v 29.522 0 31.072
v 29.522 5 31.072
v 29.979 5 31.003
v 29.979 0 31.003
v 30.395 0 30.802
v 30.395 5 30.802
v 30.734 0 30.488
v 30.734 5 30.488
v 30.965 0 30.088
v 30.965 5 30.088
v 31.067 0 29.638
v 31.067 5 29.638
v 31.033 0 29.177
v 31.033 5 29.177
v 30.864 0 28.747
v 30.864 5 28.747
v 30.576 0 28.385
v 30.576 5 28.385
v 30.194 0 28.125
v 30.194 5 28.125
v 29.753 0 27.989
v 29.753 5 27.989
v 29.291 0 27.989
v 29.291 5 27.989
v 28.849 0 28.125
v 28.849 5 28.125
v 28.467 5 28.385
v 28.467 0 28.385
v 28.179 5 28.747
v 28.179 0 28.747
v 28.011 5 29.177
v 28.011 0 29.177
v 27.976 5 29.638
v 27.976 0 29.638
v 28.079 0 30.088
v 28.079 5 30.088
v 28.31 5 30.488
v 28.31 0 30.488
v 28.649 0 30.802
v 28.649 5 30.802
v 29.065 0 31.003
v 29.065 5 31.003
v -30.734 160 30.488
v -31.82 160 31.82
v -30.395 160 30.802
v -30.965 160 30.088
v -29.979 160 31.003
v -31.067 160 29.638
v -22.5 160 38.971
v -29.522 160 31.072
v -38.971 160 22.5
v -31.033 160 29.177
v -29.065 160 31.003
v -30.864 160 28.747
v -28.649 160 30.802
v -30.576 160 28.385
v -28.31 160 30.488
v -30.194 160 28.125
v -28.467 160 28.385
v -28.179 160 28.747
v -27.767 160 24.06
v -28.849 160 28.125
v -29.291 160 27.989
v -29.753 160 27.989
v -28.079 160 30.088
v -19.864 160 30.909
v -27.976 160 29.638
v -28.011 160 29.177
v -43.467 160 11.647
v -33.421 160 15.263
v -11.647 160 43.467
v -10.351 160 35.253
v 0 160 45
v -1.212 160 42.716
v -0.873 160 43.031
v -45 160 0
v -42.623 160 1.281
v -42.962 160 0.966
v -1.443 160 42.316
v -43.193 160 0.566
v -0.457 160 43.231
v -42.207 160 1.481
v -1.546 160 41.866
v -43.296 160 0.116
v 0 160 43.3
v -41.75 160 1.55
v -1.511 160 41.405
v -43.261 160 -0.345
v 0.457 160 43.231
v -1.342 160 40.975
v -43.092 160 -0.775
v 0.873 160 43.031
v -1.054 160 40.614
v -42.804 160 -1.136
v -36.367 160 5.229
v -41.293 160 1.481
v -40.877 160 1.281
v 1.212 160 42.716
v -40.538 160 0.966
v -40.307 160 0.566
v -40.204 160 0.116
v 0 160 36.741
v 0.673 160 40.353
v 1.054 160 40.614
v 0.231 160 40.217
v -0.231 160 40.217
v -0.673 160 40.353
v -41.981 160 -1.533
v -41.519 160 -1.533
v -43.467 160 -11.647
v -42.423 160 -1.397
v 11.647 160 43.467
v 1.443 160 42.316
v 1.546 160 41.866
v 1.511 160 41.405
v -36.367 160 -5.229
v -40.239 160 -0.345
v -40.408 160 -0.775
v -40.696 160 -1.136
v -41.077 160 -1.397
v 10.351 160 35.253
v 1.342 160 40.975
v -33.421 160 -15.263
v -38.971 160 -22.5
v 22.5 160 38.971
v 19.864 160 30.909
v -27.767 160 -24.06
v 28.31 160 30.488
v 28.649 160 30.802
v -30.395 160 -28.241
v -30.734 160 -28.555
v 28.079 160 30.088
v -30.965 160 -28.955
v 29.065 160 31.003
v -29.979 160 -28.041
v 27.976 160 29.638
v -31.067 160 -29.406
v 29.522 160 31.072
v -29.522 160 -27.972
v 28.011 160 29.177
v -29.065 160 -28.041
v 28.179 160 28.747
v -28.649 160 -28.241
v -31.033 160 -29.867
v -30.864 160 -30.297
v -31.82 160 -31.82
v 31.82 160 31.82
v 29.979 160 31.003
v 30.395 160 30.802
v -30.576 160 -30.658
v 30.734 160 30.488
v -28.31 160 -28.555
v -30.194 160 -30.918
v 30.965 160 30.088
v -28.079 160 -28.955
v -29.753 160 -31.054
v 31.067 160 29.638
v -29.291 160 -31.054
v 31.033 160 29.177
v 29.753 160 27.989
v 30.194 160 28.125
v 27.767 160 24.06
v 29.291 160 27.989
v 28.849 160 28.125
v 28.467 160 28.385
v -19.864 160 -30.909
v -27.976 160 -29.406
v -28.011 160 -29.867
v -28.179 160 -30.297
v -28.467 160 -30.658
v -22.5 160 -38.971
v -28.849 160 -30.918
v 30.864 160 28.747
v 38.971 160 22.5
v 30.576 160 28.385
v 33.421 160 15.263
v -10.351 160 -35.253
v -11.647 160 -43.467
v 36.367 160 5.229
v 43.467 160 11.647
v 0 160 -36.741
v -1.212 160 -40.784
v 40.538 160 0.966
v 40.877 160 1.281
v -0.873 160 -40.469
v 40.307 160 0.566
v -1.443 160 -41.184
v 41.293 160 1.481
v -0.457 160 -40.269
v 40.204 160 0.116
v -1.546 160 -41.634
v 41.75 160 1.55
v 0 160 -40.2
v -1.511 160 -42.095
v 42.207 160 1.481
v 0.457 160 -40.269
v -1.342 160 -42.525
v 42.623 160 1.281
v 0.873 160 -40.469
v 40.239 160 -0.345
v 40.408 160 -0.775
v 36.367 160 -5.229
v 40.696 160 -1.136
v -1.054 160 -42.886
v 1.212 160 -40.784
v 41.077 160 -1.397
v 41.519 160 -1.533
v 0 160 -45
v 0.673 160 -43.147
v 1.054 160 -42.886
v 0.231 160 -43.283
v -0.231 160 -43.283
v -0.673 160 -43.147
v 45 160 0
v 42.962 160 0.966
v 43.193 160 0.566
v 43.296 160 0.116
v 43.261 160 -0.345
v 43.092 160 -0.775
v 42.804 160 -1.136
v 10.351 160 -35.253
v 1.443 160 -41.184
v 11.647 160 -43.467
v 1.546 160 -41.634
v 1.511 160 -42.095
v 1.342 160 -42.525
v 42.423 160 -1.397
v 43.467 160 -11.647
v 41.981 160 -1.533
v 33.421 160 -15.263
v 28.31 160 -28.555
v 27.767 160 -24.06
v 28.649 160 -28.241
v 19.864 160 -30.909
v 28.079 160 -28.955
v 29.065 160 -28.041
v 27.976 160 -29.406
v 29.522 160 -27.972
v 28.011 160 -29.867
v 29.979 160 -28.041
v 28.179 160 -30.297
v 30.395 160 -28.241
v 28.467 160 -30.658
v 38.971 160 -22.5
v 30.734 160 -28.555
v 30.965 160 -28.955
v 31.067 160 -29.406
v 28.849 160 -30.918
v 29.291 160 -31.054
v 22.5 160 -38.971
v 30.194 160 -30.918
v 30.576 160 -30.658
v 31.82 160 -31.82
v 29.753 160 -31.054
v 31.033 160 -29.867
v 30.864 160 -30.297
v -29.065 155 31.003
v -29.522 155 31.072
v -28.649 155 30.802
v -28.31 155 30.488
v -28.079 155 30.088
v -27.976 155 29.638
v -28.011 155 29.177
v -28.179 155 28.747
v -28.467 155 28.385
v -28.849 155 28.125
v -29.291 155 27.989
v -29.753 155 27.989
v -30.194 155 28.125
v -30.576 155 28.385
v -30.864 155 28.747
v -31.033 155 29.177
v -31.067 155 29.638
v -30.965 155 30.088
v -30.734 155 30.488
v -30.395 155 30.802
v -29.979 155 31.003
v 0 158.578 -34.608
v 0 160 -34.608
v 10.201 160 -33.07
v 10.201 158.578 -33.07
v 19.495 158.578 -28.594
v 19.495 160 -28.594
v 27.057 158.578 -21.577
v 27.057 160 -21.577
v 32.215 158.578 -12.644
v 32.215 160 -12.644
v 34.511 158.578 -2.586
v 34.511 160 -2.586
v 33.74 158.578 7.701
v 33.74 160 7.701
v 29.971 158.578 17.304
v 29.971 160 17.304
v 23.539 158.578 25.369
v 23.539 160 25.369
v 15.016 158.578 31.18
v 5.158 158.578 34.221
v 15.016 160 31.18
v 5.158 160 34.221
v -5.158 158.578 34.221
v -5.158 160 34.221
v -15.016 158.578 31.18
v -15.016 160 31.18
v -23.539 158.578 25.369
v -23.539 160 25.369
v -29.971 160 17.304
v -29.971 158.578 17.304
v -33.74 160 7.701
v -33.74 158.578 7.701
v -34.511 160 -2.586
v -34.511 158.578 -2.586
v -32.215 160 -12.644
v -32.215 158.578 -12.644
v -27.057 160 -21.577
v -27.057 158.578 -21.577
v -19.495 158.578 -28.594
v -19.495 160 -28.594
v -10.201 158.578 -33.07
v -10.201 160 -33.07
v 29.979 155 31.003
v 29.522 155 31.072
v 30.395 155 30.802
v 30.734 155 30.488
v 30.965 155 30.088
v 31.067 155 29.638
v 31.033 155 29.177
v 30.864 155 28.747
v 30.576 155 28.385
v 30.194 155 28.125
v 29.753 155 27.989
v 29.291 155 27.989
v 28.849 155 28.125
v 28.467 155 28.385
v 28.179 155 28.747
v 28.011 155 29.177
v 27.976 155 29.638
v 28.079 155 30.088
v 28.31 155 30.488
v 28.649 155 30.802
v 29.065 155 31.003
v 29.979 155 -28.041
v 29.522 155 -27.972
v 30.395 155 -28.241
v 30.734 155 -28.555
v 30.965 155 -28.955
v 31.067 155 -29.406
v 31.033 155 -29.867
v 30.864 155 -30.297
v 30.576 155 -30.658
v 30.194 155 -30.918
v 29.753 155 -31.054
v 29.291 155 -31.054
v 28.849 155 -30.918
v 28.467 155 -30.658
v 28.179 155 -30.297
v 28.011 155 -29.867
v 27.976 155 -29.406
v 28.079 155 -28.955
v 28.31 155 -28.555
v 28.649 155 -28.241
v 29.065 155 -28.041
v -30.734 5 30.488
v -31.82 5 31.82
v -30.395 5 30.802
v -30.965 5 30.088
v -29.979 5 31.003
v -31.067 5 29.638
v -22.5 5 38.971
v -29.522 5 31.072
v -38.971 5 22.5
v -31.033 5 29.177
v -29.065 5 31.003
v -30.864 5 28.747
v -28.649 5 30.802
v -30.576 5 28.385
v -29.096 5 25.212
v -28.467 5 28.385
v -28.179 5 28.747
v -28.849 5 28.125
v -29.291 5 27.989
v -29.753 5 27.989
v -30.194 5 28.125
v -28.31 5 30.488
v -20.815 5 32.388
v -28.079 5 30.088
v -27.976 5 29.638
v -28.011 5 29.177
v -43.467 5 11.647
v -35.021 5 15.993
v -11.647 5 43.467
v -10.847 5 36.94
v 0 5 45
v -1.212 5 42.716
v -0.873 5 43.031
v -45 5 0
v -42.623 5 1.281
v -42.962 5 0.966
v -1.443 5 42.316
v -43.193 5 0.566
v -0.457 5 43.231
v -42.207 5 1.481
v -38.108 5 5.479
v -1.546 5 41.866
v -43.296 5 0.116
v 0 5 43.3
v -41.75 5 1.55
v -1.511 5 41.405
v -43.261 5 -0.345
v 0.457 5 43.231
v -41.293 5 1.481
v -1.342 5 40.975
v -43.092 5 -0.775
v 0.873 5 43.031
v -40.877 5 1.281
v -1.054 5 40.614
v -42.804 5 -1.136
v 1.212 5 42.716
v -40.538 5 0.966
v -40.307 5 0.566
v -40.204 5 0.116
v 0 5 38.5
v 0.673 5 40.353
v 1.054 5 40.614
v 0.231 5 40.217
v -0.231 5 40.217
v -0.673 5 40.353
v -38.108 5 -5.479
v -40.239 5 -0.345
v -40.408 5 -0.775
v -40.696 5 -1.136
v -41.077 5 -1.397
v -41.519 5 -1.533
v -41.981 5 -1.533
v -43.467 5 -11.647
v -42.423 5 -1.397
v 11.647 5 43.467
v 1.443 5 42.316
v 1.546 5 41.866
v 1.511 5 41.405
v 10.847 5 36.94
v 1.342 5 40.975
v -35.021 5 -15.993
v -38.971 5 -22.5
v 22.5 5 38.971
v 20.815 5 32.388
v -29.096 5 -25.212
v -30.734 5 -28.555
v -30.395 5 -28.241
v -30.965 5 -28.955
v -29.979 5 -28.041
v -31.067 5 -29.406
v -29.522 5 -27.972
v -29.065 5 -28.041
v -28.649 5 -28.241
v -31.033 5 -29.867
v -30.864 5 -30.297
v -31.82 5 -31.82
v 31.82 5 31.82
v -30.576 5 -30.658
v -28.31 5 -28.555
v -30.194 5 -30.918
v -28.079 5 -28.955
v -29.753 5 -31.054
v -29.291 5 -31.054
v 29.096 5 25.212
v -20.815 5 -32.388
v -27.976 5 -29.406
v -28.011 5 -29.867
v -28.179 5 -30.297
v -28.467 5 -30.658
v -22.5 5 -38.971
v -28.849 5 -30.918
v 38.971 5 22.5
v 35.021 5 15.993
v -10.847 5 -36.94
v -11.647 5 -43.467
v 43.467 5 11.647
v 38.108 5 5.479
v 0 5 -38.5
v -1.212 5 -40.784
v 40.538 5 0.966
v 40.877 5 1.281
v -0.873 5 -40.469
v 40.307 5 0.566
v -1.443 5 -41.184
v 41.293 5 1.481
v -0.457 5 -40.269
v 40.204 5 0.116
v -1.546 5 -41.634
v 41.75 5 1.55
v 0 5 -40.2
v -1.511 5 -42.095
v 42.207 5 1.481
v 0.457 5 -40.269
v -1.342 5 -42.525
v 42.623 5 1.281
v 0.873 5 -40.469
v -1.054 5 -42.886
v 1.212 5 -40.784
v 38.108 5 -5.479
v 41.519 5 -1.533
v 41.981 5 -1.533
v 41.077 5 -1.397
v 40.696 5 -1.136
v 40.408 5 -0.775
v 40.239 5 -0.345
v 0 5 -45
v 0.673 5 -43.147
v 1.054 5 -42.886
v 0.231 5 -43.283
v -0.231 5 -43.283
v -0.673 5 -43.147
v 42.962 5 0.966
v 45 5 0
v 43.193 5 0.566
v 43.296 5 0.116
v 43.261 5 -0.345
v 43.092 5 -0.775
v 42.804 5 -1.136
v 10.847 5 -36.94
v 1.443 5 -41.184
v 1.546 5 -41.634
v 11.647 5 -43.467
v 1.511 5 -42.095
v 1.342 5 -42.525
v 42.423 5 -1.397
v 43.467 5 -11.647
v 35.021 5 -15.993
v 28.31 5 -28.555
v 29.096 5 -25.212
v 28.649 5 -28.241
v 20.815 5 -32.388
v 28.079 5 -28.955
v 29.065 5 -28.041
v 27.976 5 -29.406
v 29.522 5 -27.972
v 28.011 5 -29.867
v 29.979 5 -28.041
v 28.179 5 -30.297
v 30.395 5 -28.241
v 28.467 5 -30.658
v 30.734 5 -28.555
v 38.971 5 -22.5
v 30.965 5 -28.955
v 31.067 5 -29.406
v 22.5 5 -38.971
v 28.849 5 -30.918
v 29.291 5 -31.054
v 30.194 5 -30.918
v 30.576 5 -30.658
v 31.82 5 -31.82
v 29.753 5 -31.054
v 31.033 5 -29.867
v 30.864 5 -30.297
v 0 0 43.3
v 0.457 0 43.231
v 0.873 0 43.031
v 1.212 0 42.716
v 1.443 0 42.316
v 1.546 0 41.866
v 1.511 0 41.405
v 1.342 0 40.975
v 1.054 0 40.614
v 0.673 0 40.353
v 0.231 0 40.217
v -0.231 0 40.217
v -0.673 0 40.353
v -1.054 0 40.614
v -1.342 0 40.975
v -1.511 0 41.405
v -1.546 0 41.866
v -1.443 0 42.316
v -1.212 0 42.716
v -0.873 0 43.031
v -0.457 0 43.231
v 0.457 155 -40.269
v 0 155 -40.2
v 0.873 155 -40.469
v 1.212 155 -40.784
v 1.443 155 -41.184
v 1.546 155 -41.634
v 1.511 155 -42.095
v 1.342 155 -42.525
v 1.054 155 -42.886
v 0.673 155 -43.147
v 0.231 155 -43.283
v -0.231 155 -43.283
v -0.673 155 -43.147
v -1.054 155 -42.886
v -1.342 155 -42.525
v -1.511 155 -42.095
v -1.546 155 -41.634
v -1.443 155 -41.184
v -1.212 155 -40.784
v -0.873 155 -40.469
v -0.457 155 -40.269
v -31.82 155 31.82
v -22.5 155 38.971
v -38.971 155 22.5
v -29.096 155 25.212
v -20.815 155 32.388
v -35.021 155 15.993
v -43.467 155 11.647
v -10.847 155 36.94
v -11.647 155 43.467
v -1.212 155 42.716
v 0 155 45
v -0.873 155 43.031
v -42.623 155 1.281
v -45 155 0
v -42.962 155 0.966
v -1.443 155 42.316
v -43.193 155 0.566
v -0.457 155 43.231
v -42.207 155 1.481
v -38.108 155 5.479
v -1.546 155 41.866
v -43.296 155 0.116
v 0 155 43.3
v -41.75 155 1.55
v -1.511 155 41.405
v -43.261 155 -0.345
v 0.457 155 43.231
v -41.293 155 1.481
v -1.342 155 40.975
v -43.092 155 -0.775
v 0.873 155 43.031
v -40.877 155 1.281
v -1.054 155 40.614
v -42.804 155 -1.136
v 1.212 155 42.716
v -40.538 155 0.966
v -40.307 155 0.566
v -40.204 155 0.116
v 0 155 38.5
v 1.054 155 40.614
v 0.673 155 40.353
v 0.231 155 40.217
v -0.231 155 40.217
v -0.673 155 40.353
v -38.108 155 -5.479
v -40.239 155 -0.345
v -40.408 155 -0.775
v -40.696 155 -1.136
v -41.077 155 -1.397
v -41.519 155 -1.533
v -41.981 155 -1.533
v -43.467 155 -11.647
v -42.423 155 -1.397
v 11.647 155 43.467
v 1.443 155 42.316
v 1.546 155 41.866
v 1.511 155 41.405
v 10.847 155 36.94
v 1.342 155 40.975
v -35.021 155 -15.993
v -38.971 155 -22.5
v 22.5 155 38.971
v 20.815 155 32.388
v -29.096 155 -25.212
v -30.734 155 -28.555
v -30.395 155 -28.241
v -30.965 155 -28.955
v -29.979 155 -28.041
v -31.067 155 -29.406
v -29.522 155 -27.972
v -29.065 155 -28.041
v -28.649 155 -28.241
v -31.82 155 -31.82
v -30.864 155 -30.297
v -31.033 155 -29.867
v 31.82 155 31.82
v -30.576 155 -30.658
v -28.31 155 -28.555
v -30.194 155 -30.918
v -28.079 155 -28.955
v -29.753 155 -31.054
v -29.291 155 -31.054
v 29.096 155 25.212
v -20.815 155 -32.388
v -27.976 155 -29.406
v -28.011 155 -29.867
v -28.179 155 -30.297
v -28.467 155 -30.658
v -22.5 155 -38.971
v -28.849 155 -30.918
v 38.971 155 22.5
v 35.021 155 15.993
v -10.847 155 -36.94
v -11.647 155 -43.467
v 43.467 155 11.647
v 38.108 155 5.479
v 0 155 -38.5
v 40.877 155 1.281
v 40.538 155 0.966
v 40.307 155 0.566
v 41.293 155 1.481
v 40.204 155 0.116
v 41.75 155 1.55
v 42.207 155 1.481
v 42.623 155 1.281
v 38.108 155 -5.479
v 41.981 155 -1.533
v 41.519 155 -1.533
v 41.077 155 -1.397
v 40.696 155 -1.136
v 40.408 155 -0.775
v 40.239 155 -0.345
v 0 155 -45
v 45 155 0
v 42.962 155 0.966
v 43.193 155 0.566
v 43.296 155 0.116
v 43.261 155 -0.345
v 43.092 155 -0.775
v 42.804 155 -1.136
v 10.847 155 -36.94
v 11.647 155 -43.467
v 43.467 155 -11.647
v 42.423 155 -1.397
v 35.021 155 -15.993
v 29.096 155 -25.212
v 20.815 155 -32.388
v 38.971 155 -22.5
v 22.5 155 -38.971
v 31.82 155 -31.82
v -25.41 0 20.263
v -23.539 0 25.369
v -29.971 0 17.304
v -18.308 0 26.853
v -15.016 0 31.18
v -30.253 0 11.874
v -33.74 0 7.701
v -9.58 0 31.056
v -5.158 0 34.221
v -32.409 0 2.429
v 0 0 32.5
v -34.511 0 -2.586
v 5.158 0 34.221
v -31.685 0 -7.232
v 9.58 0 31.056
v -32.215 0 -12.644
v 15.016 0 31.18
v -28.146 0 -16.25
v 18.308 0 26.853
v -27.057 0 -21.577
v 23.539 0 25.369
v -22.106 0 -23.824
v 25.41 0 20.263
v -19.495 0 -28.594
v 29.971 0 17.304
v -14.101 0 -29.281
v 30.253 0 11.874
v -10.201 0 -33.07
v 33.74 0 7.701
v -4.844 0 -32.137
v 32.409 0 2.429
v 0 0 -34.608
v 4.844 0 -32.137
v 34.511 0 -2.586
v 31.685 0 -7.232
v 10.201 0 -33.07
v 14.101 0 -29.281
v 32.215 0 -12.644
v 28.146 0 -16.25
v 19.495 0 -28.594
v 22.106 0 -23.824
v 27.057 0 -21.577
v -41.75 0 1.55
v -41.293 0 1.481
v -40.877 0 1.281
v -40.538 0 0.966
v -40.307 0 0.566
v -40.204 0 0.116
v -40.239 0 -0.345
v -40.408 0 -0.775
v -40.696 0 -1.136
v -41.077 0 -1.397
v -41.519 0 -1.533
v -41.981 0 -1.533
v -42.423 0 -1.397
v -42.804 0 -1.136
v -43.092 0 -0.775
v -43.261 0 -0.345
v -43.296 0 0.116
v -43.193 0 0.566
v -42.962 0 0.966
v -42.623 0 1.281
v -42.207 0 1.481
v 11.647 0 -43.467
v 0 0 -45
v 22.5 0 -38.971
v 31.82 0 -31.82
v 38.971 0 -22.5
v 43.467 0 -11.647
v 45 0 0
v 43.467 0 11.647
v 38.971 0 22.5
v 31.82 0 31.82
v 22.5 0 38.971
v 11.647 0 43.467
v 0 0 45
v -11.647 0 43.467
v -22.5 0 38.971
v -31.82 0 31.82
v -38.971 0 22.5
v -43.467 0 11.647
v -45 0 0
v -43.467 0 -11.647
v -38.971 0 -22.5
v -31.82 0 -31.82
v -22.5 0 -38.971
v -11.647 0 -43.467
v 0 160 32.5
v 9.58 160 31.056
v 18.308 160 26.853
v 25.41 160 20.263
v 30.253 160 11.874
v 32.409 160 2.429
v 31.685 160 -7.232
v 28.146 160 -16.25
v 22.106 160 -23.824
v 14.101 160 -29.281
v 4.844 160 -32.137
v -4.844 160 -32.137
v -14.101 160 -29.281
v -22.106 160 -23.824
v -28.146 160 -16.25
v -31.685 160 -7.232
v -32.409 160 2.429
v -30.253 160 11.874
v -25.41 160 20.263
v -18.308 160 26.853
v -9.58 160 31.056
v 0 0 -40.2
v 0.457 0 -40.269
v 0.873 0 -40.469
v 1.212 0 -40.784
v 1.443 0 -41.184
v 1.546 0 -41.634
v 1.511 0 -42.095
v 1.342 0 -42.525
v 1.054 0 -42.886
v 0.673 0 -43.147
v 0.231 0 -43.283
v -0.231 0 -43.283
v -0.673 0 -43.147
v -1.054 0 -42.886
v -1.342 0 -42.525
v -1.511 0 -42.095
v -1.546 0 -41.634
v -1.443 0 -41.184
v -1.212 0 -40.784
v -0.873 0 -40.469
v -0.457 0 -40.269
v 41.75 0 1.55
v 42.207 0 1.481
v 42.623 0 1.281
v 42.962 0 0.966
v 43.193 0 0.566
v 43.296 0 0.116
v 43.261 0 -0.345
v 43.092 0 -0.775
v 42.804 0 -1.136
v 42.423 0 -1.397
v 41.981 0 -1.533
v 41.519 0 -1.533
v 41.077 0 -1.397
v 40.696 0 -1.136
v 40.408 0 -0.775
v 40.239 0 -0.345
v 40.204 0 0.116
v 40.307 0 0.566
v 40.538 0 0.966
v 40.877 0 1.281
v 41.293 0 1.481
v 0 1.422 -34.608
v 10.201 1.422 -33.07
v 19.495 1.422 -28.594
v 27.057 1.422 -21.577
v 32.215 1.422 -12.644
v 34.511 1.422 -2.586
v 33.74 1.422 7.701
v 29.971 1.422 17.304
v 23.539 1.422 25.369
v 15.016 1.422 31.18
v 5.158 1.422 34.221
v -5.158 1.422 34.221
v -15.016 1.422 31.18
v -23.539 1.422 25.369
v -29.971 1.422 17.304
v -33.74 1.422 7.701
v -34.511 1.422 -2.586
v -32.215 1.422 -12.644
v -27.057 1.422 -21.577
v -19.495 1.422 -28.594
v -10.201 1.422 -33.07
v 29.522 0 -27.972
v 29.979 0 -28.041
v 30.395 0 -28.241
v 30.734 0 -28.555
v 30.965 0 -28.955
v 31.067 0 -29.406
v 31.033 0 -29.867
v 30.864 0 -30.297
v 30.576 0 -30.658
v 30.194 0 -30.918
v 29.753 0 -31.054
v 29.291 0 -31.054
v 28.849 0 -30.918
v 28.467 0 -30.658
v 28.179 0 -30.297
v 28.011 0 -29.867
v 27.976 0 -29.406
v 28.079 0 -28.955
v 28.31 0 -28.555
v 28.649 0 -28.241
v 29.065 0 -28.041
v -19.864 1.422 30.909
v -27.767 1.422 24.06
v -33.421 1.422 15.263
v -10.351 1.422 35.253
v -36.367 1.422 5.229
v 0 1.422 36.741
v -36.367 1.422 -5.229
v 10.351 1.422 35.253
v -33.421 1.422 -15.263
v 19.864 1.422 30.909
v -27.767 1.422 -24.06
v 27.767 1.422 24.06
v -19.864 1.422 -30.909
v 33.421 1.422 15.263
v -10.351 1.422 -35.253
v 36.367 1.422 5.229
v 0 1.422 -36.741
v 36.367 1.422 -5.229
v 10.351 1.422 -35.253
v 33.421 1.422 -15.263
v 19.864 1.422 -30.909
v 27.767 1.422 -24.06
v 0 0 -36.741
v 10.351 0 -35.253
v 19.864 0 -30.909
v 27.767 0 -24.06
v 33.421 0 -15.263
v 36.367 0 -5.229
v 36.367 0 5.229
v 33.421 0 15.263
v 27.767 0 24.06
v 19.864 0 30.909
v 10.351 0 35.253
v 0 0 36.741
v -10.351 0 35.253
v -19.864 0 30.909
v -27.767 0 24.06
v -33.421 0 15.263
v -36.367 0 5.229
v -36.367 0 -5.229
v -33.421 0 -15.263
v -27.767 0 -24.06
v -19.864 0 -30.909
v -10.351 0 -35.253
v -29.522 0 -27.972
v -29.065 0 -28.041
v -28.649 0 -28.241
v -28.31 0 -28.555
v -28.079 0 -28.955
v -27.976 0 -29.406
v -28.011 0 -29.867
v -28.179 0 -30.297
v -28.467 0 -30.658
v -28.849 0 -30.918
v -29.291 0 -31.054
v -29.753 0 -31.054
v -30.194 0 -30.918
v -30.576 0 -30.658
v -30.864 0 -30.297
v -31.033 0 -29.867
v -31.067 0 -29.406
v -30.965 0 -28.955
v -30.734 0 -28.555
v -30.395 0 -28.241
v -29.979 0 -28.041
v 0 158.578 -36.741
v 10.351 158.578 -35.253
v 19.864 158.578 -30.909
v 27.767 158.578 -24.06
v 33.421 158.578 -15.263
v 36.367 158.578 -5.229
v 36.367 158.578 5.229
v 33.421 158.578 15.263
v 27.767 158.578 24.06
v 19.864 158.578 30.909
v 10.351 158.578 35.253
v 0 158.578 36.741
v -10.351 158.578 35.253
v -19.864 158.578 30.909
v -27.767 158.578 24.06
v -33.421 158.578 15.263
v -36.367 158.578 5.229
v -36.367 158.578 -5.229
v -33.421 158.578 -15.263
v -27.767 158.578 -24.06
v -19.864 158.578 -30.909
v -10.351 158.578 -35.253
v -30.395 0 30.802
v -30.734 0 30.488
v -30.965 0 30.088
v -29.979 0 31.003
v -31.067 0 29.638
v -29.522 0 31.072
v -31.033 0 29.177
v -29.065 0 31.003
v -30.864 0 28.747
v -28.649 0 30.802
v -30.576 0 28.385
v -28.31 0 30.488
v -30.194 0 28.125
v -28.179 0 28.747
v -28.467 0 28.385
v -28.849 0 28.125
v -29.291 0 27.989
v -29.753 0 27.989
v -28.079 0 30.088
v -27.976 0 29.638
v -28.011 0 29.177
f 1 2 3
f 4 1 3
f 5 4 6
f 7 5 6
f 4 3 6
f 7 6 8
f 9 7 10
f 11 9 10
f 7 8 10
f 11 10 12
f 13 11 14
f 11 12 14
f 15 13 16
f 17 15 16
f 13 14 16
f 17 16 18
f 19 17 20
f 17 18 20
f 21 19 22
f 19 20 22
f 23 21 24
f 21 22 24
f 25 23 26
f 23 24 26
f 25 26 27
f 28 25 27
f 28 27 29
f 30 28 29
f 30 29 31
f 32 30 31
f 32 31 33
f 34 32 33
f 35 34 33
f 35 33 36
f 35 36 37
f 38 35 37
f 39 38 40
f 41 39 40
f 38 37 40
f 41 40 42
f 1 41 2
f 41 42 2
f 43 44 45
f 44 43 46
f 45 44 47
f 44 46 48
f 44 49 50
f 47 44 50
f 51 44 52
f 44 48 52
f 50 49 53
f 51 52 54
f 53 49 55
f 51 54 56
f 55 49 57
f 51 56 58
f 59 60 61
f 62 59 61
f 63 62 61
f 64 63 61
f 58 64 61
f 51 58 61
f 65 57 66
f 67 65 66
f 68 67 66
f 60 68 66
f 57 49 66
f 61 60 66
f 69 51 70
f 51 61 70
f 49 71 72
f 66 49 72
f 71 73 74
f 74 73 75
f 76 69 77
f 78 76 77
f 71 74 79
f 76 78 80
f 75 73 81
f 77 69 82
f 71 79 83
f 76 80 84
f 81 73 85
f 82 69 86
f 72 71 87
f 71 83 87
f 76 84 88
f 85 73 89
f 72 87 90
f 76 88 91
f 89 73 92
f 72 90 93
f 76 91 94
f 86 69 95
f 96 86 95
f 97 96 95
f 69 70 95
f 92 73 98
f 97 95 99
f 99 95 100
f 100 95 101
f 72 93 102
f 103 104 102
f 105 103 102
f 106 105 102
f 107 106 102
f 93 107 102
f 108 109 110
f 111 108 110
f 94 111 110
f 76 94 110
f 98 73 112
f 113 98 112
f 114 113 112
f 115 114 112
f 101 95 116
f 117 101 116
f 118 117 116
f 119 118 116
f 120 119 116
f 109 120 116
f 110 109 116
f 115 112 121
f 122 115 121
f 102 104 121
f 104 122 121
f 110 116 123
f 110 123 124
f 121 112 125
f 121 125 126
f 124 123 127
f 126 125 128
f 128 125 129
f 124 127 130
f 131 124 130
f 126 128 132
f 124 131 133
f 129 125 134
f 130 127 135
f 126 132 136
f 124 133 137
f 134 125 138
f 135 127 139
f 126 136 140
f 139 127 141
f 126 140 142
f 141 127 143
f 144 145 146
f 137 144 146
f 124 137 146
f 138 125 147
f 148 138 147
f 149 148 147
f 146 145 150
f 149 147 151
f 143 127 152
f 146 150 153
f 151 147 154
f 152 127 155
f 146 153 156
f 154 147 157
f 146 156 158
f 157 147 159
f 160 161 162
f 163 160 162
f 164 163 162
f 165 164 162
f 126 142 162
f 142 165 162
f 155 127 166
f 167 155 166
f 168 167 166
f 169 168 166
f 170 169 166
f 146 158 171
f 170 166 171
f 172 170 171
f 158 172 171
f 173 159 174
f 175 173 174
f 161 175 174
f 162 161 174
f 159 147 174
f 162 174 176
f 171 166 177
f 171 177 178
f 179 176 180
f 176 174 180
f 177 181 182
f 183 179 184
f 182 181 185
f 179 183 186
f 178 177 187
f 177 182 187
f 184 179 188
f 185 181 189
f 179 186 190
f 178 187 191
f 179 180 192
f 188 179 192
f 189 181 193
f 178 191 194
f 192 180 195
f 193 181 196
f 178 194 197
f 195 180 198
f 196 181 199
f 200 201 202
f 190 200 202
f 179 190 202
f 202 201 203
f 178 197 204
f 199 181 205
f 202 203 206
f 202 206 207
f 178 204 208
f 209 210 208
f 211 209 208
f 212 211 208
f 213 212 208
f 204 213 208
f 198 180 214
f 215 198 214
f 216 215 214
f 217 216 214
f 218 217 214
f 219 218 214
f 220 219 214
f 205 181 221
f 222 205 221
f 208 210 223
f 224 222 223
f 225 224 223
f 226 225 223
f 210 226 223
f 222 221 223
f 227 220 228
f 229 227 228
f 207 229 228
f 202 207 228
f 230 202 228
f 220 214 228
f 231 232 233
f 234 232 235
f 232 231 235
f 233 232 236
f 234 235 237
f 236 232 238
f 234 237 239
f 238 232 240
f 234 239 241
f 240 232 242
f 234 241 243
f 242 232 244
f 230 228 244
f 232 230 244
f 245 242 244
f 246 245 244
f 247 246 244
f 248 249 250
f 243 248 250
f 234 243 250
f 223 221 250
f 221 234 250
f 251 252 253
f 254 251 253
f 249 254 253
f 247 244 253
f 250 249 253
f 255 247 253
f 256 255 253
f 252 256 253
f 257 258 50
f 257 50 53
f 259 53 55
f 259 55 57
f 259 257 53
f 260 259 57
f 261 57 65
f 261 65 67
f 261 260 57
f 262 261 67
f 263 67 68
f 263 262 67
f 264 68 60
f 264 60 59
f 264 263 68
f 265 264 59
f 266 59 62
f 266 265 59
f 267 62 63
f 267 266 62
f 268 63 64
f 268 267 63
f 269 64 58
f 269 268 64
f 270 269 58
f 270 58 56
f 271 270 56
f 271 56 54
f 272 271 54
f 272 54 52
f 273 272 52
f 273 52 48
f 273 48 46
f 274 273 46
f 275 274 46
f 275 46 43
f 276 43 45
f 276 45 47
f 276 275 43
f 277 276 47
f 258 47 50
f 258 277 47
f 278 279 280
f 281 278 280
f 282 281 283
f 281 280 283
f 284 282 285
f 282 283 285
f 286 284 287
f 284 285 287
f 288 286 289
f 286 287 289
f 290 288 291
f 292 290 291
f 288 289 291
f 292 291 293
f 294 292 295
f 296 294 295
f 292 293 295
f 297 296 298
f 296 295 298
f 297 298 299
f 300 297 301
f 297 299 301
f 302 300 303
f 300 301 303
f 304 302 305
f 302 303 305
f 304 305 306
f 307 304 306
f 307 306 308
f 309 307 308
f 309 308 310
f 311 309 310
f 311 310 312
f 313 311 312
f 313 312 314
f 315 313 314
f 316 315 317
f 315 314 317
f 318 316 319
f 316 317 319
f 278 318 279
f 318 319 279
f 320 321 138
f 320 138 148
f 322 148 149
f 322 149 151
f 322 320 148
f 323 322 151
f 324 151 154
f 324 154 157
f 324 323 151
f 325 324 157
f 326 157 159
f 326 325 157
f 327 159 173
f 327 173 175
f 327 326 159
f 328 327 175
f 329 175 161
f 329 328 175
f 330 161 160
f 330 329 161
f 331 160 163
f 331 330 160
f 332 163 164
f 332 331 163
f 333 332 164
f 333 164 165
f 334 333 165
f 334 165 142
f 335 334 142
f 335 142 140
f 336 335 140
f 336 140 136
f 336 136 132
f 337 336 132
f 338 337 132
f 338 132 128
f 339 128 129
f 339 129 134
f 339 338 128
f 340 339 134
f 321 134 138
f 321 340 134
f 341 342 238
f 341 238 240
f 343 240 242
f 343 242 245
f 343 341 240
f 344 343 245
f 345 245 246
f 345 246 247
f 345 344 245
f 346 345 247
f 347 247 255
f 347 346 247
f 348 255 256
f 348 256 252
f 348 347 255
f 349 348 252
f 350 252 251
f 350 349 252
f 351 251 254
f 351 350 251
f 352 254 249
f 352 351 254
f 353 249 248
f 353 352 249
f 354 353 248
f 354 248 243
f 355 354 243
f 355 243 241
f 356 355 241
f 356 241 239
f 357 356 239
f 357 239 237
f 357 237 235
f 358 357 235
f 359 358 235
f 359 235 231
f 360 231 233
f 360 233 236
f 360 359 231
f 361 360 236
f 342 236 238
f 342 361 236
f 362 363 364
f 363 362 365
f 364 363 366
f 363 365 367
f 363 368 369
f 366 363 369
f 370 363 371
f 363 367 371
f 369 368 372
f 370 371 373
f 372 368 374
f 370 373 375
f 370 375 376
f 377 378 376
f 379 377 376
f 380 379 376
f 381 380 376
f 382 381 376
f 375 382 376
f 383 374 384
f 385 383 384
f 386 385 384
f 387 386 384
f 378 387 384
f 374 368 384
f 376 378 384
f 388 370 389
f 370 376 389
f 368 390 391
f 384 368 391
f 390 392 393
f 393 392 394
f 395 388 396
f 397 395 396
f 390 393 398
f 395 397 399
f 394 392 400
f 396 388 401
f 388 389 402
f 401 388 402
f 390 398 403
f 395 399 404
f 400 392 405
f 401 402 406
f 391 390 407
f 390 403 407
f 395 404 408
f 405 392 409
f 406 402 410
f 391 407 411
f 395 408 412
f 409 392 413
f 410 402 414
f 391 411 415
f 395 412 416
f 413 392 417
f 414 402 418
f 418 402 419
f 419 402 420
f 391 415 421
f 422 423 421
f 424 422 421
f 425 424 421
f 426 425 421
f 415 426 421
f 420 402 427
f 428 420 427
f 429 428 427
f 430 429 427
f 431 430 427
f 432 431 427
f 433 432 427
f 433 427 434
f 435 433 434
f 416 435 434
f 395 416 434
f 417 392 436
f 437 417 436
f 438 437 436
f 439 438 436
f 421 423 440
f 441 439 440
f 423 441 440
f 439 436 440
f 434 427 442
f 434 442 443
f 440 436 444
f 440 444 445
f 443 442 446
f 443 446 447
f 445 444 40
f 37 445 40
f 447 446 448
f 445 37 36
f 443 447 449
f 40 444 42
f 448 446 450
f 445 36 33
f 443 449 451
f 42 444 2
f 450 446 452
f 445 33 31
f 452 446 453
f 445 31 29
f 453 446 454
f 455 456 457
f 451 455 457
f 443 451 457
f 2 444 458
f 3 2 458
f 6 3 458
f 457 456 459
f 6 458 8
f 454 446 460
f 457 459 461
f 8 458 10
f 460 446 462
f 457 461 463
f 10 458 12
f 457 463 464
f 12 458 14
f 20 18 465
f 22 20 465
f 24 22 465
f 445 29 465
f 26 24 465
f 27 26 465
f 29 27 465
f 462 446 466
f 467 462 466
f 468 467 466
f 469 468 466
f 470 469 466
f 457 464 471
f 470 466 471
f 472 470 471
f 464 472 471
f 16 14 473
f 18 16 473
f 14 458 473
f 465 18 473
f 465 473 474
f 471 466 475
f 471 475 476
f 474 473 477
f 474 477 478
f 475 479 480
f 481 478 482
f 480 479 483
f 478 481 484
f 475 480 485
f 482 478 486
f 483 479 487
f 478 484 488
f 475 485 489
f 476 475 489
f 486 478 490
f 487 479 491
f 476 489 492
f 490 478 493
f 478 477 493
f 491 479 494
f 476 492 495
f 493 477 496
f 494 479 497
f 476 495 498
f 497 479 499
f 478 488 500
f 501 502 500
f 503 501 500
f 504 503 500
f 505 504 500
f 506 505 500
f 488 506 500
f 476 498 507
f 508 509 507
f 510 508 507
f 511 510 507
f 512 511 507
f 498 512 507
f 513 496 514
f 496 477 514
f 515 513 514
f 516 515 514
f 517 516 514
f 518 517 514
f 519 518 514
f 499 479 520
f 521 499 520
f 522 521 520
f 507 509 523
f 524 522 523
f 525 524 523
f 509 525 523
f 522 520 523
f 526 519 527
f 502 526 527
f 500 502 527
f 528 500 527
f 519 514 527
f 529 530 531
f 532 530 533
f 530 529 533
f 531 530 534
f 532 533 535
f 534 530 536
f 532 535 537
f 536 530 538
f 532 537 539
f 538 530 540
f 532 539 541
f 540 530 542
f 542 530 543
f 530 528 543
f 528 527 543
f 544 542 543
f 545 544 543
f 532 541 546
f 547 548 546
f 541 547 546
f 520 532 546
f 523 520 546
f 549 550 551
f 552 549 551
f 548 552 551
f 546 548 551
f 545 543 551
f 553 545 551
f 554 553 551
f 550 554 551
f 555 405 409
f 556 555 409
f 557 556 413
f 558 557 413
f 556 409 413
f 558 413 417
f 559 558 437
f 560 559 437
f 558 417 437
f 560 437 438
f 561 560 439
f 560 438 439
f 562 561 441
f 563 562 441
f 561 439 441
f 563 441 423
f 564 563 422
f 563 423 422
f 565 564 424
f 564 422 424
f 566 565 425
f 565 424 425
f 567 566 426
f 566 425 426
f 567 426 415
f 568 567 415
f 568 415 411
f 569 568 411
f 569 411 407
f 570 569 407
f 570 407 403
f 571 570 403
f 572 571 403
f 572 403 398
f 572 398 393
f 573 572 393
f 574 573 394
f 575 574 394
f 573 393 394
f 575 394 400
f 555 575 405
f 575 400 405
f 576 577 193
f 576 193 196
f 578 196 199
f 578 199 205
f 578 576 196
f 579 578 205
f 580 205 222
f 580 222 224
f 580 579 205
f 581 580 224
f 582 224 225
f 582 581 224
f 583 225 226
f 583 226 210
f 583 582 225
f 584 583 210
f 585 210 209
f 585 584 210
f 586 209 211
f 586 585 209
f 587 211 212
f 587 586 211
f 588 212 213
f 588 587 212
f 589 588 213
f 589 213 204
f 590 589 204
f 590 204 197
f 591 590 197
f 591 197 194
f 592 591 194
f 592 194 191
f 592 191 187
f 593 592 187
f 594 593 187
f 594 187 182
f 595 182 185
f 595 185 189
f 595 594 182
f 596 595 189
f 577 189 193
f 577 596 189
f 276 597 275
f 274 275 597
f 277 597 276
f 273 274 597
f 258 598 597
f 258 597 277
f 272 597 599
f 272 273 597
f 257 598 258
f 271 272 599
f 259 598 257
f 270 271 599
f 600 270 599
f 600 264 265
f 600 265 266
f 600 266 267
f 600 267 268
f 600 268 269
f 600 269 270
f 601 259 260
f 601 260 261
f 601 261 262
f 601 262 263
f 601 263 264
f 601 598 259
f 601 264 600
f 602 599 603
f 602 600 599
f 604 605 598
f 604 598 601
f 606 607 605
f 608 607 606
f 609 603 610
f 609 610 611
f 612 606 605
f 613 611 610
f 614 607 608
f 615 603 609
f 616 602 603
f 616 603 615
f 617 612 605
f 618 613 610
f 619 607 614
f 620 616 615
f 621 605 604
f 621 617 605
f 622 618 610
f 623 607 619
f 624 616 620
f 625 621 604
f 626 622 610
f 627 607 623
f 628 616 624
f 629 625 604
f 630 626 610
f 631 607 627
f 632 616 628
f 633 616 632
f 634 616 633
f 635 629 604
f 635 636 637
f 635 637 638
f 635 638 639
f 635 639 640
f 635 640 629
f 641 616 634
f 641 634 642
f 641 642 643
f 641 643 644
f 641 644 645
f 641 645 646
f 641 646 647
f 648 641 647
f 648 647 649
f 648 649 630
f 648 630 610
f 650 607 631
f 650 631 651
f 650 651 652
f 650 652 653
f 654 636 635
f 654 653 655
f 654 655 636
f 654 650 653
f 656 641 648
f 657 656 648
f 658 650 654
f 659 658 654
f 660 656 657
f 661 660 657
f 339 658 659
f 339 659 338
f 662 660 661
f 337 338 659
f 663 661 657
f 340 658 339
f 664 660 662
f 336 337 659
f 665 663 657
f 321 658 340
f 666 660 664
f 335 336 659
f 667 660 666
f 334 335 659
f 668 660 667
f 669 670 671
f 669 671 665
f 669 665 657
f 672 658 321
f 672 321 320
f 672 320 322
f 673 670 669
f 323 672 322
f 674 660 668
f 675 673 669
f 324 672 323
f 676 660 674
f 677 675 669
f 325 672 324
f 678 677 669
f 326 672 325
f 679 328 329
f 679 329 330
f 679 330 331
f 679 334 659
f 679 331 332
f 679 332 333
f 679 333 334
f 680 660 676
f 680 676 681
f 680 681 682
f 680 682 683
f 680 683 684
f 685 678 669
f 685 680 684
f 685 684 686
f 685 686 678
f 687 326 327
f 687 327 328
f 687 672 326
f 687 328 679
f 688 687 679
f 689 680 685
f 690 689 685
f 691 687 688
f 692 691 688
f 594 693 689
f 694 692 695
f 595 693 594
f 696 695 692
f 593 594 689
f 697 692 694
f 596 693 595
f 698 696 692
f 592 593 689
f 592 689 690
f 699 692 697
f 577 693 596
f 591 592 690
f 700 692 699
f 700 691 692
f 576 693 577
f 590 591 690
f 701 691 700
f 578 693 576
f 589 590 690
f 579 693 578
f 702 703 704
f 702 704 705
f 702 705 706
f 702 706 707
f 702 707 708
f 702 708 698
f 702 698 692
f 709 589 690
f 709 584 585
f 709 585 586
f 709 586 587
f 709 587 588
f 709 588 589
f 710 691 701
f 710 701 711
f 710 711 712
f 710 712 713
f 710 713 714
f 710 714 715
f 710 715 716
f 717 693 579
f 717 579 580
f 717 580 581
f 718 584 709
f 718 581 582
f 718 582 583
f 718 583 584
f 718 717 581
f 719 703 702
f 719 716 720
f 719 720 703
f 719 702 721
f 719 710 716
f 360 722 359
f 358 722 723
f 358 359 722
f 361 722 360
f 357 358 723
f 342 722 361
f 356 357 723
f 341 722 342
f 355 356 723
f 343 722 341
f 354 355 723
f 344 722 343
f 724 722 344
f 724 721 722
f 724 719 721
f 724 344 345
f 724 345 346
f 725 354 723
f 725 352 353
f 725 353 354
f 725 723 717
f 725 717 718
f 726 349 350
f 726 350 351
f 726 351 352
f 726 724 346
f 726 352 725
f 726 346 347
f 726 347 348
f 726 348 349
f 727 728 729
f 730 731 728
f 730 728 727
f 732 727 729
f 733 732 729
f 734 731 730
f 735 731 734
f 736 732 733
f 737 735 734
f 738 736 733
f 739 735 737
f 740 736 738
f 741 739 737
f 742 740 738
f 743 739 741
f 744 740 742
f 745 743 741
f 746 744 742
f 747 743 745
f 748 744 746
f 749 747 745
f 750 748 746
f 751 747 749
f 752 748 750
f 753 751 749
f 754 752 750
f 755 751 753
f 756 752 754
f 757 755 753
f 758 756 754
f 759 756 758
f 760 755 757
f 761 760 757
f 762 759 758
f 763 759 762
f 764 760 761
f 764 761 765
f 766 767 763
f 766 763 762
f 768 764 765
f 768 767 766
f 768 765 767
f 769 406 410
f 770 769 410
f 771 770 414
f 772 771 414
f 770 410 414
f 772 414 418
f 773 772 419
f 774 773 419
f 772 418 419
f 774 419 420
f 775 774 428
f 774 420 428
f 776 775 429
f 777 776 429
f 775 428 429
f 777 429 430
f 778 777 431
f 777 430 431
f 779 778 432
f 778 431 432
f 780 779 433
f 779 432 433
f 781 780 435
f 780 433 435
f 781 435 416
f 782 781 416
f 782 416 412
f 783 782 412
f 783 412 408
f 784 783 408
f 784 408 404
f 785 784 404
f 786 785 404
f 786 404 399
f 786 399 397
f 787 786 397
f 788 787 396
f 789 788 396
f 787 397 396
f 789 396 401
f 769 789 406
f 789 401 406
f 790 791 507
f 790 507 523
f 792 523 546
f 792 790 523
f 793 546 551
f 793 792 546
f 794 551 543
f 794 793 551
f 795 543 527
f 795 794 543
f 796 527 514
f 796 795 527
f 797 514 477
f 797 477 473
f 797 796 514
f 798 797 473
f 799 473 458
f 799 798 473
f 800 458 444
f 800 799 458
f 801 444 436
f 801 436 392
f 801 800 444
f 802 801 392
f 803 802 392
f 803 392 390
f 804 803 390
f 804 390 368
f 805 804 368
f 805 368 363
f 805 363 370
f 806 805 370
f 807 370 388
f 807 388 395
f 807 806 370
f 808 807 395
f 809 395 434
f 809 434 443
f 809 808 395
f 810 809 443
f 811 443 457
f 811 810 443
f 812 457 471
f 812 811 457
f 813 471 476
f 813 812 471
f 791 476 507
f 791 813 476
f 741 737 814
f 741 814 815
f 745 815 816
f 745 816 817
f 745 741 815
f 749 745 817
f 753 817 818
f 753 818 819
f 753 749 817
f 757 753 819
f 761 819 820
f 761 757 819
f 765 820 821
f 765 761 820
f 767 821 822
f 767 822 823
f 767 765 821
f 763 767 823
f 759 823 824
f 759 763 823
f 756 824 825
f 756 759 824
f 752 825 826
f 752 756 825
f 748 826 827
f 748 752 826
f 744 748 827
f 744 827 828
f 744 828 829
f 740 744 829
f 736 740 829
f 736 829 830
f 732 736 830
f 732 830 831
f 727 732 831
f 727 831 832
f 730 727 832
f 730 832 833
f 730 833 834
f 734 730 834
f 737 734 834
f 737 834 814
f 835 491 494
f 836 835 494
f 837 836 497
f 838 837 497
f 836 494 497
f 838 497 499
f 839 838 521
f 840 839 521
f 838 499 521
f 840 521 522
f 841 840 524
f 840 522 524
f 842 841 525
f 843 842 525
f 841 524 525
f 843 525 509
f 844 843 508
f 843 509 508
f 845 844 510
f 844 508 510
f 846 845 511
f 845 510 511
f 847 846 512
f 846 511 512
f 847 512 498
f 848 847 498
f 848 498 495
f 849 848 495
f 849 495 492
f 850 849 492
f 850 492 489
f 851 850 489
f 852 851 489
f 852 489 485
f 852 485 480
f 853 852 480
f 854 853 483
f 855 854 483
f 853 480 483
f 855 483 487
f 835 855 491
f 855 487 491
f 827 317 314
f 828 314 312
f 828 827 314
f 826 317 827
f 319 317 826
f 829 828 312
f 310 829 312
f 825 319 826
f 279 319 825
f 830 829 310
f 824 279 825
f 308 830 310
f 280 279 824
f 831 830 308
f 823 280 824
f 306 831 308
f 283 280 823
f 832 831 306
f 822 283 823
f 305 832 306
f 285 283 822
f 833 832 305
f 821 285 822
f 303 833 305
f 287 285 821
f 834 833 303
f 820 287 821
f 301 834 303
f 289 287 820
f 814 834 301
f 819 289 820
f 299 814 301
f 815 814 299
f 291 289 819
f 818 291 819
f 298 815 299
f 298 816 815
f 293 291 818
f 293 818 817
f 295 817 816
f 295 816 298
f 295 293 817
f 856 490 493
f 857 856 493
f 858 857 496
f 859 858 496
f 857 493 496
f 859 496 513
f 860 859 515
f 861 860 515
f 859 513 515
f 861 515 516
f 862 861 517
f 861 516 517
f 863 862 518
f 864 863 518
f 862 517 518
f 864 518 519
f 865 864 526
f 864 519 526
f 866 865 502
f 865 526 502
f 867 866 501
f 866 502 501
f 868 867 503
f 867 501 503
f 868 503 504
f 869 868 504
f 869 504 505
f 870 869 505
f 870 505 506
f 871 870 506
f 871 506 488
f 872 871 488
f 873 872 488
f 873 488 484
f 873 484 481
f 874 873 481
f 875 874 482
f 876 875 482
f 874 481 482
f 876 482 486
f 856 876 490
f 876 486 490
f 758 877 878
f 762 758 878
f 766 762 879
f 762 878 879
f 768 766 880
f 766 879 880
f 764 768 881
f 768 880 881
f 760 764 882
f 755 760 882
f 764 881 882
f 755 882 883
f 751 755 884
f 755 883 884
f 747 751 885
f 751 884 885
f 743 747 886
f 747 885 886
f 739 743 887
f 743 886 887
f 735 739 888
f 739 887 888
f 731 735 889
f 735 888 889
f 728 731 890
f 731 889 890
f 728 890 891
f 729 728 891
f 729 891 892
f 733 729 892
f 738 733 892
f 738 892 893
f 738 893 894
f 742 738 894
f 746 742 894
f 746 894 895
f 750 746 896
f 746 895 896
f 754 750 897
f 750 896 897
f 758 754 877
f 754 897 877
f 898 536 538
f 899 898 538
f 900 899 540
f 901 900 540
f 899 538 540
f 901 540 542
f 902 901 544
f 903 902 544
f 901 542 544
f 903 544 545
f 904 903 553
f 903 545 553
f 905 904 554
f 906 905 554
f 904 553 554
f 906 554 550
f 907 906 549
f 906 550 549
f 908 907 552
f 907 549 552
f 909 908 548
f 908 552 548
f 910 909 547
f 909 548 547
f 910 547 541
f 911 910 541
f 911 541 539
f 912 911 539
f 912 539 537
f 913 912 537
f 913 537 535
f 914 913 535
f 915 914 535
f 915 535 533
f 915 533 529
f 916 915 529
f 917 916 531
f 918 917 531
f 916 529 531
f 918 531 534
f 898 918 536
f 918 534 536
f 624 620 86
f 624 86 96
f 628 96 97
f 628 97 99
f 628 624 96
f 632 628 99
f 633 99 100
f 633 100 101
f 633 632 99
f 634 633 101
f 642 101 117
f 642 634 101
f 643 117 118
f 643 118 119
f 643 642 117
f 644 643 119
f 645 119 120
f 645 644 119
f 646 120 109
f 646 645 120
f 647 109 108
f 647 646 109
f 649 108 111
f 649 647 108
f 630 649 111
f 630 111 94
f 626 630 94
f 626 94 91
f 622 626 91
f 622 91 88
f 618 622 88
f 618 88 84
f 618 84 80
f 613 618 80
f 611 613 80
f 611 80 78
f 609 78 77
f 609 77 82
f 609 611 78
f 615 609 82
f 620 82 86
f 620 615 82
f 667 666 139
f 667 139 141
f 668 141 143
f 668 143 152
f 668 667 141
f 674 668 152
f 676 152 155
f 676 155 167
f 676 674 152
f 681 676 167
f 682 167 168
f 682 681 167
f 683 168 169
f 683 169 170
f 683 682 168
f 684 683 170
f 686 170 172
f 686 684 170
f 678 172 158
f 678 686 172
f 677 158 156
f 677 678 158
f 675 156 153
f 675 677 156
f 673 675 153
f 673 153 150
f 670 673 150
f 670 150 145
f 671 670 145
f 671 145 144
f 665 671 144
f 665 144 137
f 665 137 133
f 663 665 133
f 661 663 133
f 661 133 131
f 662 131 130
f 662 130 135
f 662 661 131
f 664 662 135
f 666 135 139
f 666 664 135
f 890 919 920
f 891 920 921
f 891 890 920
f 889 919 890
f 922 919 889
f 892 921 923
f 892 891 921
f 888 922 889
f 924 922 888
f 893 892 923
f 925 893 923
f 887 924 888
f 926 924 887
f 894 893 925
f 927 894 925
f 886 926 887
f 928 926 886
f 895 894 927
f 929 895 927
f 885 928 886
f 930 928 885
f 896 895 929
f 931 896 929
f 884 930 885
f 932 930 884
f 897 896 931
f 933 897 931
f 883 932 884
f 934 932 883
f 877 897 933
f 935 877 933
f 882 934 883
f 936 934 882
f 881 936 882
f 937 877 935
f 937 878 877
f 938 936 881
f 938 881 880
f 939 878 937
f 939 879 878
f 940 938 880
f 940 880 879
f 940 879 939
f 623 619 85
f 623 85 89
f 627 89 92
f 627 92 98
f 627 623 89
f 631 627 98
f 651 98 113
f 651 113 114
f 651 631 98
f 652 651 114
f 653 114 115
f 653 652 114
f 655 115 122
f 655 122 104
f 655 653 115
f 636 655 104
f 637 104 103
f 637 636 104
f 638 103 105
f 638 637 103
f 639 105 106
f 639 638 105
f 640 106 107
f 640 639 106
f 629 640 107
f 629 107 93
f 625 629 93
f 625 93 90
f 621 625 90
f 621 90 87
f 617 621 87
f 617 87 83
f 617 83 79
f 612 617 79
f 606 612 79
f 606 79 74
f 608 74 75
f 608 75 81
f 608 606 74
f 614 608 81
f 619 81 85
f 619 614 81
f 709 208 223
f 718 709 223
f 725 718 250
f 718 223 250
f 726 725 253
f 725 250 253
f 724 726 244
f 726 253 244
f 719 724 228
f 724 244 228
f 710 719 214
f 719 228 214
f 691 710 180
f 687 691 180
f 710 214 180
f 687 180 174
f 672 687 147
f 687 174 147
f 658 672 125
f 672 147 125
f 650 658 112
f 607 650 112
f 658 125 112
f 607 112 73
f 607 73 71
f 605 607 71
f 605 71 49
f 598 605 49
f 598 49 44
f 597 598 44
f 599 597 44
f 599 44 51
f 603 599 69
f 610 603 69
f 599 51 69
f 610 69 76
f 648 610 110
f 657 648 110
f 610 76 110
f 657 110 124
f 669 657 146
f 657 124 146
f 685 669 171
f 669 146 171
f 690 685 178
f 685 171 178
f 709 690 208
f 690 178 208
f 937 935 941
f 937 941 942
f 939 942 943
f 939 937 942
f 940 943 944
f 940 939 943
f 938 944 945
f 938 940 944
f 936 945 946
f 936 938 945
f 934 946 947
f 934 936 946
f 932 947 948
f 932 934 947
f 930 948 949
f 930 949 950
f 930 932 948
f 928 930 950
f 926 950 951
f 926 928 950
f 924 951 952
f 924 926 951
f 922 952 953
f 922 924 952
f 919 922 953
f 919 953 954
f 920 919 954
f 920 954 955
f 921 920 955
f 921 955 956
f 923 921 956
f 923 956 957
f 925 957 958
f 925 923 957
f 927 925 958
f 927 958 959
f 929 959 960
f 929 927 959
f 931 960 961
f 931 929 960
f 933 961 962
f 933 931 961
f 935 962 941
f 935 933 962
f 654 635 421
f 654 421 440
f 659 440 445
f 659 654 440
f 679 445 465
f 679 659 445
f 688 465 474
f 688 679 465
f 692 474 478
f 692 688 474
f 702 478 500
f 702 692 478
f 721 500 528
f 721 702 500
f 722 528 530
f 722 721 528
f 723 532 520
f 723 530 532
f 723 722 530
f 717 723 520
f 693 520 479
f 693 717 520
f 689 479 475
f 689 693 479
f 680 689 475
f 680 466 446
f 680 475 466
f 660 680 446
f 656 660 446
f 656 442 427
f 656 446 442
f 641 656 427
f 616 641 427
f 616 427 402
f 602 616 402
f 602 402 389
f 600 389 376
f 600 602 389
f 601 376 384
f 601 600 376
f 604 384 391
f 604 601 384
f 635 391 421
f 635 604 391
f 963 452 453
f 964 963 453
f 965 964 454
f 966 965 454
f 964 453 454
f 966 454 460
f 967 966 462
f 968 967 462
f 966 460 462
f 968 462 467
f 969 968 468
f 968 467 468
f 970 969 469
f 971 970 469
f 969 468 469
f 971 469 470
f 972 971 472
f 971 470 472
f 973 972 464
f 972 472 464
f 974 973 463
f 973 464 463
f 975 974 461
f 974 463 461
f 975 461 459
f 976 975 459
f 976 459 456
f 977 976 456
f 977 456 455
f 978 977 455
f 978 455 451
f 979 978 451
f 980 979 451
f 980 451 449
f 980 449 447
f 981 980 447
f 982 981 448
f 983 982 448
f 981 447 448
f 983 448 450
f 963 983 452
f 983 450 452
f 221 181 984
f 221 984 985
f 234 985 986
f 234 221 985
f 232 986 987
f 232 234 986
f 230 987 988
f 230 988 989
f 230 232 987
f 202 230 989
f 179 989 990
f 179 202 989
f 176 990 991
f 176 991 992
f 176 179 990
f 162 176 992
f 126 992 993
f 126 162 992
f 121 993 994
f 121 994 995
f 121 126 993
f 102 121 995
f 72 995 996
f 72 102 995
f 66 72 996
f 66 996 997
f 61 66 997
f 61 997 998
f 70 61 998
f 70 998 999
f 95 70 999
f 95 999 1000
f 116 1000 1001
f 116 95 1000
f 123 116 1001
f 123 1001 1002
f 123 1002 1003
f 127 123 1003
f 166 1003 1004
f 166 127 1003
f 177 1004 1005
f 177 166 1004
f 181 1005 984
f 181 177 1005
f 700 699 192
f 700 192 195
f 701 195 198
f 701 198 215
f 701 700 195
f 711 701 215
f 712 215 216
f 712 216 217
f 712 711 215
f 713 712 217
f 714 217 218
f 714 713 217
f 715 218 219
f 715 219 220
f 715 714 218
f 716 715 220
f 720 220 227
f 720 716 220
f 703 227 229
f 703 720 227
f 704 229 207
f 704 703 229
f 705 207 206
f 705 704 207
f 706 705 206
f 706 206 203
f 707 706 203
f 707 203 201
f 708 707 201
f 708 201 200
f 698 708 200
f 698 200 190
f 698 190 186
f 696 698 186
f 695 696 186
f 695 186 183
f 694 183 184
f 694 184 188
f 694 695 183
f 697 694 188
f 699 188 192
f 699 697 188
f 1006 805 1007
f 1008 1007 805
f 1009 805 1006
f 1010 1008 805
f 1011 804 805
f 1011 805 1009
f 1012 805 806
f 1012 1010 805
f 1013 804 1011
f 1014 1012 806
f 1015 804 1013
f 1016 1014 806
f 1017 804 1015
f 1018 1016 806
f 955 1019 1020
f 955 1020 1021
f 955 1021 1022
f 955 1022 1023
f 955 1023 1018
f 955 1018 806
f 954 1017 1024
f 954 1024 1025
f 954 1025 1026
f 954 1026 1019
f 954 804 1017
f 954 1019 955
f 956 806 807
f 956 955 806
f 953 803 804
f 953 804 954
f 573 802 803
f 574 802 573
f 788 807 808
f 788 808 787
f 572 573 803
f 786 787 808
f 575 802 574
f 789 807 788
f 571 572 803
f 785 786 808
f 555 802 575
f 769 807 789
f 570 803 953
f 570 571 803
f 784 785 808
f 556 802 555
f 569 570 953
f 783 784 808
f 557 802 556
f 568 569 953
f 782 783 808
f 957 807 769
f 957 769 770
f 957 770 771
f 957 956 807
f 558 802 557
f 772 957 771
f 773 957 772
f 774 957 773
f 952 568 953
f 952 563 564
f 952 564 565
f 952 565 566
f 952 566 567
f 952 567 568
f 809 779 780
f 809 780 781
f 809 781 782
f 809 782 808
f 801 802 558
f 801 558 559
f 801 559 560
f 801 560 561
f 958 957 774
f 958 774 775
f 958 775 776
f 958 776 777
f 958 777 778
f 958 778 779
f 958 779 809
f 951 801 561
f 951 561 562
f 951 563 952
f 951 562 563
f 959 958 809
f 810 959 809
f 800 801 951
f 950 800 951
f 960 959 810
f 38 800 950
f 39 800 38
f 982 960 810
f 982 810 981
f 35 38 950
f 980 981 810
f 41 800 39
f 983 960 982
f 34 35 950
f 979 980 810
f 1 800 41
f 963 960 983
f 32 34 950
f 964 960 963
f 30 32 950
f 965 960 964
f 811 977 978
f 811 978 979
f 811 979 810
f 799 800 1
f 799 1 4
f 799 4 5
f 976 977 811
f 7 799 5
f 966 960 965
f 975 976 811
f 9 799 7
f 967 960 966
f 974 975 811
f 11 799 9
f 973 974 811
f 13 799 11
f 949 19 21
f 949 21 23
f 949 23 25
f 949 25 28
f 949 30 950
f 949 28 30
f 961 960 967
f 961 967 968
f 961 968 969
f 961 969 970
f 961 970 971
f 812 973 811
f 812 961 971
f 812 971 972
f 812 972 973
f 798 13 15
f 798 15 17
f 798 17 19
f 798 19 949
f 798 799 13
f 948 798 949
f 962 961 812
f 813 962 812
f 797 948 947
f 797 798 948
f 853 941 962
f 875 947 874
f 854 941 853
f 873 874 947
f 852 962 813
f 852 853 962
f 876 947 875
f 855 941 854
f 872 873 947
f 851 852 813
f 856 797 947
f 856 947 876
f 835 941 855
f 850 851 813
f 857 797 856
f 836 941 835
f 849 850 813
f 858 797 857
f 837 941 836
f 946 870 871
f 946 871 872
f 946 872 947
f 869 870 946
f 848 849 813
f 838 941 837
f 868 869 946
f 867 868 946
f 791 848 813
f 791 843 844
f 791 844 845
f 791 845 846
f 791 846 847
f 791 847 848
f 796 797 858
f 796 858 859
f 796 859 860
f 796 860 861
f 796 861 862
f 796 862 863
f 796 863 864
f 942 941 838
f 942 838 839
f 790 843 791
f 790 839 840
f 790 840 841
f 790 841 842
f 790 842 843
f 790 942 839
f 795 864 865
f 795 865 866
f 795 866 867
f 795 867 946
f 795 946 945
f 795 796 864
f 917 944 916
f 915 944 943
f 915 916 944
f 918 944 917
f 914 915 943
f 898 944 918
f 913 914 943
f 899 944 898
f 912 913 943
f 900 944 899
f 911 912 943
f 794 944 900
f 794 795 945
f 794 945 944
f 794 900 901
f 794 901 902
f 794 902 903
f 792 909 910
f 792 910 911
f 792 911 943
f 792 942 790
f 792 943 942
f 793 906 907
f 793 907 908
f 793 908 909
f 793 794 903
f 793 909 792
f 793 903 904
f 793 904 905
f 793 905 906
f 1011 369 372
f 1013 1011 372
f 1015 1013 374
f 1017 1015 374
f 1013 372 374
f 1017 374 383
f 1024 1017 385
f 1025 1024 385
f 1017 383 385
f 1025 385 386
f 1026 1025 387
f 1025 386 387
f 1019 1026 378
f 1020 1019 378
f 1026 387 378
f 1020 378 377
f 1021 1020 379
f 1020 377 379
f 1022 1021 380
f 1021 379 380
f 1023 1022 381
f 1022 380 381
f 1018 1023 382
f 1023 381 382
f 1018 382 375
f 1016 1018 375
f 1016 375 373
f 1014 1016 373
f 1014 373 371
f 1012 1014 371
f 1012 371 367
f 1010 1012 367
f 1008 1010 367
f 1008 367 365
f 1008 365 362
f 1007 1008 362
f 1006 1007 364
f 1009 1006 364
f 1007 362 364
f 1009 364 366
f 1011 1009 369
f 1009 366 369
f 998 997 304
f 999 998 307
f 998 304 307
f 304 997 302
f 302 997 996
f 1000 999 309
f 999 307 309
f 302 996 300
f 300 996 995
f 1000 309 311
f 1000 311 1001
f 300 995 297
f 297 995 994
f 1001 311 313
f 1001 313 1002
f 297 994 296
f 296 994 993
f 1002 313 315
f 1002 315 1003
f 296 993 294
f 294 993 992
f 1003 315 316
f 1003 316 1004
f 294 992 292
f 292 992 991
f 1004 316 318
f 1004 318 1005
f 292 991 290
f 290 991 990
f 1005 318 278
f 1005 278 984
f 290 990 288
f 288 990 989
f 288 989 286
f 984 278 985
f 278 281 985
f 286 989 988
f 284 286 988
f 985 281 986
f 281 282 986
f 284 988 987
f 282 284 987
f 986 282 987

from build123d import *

# Parameters (mm, degrees)
SKETCH3_R           = 38.5
SKETCH3_R_2         = 32.5
BOSS_EXTRUDE3_DEPTH = 160
SKETCH5_R           = 36.7411
SKETCH5_R_2         = 34.6075
CUT_EXTRUDE1_DEPTH  = 1.4224
SKETCH5_4_R         = 45
SKETCH5_4_R_2       = 38.5
BOSS_EXTRUDE5_DEPTH = 5
SKETCH7_R           = 1.55
CUT_EXTRUDE2_DEPTH  = 5
CUT_EXTRUDE3_START  = -80
SKETCH9_R           = 38.5
SKETCH9_R_2         = 32.5
CUT_EXTRUDE3_DEPTH  = 80
CUT_EXTRUDE6_START  = -1.4224
SKETCH5_7_R         = 36.7411
SKETCH5_7_R_2       = 34.6075
CUT_EXTRUDE6_DEPTH  = 1.4224


with BuildPart() as part:
    # Sketch3 → Boss-Extrude3 (new body)
    with BuildSketch(Plane(origin=(0, 0, 0), x_dir=(1, 0, 0), z_dir=(0, 1, 0))):
        Circle(SKETCH3_R)
        Circle(SKETCH3_R_2, mode=Mode.SUBTRACT)
    boss_extrude3 = extrude(amount=BOSS_EXTRUDE3_DEPTH)

    # Sketch5 → Cut-Extrude1 (cut)
    with BuildSketch(Plane.XZ):
        Circle(SKETCH5_R)
        Circle(SKETCH5_R_2, mode=Mode.SUBTRACT)
    cut_extrude1 = extrude(amount=-CUT_EXTRUDE1_DEPTH, mode=Mode.SUBTRACT)

    # Sketch5<4> → Boss-Extrude5 (add)
    with BuildSketch(Plane.XZ):
        Circle(SKETCH5_4_R)
        Circle(SKETCH5_4_R_2, mode=Mode.SUBTRACT)
    boss_extrude5 = extrude(amount=-BOSS_EXTRUDE5_DEPTH)

    # Sketch7 → Cut-Extrude2 (cut)
    with BuildSketch(Plane(origin=(0, 5, 0), x_dir=(1, 0, 0), z_dir=(0, 1, 0))):
        with Locations((0, 41.75)):
            Circle(SKETCH7_R)
        with Locations((29.521708115, 29.521708115)):
            Circle(SKETCH7_R)
        with Locations((41.75, 0)):
            Circle(SKETCH7_R)
        with Locations((29.521708115, -29.521708115)):
            Circle(SKETCH7_R)
        with Locations((0, -41.75)):
            Circle(SKETCH7_R)
        with Locations((-29.521708115, -29.521708115)):
            Circle(SKETCH7_R)
        with Locations((-41.75, 0)):
            Circle(SKETCH7_R)
        with Locations((-29.521708115, 29.521708115)):
            Circle(SKETCH7_R)
    cut_extrude2 = extrude(amount=-CUT_EXTRUDE2_DEPTH, mode=Mode.SUBTRACT)

    # Sketch9 → Cut-Extrude3 (cut)
    with BuildSketch(Plane(origin=(0, 160, 0), x_dir=(1, 0, 0), z_dir=(0, 1, 0)).offset(CUT_EXTRUDE3_START)):
        Circle(SKETCH9_R)
        Circle(SKETCH9_R_2, mode=Mode.SUBTRACT)
    extrude(amount=CUT_EXTRUDE3_DEPTH, mode=Mode.SUBTRACT)

    # Mirror7: Boss-Extrude3, Cut-Extrude1, Boss-Extrude5, Cut-Extrude2 across plane
    add(boss_extrude3.mirror(Plane.ZX.offset(80)))
    add(cut_extrude1.mirror(Plane.ZX.offset(80)), mode=Mode.SUBTRACT)
    add(boss_extrude5.mirror(Plane.ZX.offset(80)))
    add(cut_extrude2.mirror(Plane.ZX.offset(80)), mode=Mode.SUBTRACT)

    # Sketch5<7> → Cut-Extrude6 (cut)
    with BuildSketch(Plane.XZ.offset(CUT_EXTRUDE6_START)):
        Circle(SKETCH5_7_R)
        Circle(SKETCH5_7_R_2, mode=Mode.SUBTRACT)
    extrude(amount=CUT_EXTRUDE6_DEPTH, mode=Mode.SUBTRACT)


solid = part.part
